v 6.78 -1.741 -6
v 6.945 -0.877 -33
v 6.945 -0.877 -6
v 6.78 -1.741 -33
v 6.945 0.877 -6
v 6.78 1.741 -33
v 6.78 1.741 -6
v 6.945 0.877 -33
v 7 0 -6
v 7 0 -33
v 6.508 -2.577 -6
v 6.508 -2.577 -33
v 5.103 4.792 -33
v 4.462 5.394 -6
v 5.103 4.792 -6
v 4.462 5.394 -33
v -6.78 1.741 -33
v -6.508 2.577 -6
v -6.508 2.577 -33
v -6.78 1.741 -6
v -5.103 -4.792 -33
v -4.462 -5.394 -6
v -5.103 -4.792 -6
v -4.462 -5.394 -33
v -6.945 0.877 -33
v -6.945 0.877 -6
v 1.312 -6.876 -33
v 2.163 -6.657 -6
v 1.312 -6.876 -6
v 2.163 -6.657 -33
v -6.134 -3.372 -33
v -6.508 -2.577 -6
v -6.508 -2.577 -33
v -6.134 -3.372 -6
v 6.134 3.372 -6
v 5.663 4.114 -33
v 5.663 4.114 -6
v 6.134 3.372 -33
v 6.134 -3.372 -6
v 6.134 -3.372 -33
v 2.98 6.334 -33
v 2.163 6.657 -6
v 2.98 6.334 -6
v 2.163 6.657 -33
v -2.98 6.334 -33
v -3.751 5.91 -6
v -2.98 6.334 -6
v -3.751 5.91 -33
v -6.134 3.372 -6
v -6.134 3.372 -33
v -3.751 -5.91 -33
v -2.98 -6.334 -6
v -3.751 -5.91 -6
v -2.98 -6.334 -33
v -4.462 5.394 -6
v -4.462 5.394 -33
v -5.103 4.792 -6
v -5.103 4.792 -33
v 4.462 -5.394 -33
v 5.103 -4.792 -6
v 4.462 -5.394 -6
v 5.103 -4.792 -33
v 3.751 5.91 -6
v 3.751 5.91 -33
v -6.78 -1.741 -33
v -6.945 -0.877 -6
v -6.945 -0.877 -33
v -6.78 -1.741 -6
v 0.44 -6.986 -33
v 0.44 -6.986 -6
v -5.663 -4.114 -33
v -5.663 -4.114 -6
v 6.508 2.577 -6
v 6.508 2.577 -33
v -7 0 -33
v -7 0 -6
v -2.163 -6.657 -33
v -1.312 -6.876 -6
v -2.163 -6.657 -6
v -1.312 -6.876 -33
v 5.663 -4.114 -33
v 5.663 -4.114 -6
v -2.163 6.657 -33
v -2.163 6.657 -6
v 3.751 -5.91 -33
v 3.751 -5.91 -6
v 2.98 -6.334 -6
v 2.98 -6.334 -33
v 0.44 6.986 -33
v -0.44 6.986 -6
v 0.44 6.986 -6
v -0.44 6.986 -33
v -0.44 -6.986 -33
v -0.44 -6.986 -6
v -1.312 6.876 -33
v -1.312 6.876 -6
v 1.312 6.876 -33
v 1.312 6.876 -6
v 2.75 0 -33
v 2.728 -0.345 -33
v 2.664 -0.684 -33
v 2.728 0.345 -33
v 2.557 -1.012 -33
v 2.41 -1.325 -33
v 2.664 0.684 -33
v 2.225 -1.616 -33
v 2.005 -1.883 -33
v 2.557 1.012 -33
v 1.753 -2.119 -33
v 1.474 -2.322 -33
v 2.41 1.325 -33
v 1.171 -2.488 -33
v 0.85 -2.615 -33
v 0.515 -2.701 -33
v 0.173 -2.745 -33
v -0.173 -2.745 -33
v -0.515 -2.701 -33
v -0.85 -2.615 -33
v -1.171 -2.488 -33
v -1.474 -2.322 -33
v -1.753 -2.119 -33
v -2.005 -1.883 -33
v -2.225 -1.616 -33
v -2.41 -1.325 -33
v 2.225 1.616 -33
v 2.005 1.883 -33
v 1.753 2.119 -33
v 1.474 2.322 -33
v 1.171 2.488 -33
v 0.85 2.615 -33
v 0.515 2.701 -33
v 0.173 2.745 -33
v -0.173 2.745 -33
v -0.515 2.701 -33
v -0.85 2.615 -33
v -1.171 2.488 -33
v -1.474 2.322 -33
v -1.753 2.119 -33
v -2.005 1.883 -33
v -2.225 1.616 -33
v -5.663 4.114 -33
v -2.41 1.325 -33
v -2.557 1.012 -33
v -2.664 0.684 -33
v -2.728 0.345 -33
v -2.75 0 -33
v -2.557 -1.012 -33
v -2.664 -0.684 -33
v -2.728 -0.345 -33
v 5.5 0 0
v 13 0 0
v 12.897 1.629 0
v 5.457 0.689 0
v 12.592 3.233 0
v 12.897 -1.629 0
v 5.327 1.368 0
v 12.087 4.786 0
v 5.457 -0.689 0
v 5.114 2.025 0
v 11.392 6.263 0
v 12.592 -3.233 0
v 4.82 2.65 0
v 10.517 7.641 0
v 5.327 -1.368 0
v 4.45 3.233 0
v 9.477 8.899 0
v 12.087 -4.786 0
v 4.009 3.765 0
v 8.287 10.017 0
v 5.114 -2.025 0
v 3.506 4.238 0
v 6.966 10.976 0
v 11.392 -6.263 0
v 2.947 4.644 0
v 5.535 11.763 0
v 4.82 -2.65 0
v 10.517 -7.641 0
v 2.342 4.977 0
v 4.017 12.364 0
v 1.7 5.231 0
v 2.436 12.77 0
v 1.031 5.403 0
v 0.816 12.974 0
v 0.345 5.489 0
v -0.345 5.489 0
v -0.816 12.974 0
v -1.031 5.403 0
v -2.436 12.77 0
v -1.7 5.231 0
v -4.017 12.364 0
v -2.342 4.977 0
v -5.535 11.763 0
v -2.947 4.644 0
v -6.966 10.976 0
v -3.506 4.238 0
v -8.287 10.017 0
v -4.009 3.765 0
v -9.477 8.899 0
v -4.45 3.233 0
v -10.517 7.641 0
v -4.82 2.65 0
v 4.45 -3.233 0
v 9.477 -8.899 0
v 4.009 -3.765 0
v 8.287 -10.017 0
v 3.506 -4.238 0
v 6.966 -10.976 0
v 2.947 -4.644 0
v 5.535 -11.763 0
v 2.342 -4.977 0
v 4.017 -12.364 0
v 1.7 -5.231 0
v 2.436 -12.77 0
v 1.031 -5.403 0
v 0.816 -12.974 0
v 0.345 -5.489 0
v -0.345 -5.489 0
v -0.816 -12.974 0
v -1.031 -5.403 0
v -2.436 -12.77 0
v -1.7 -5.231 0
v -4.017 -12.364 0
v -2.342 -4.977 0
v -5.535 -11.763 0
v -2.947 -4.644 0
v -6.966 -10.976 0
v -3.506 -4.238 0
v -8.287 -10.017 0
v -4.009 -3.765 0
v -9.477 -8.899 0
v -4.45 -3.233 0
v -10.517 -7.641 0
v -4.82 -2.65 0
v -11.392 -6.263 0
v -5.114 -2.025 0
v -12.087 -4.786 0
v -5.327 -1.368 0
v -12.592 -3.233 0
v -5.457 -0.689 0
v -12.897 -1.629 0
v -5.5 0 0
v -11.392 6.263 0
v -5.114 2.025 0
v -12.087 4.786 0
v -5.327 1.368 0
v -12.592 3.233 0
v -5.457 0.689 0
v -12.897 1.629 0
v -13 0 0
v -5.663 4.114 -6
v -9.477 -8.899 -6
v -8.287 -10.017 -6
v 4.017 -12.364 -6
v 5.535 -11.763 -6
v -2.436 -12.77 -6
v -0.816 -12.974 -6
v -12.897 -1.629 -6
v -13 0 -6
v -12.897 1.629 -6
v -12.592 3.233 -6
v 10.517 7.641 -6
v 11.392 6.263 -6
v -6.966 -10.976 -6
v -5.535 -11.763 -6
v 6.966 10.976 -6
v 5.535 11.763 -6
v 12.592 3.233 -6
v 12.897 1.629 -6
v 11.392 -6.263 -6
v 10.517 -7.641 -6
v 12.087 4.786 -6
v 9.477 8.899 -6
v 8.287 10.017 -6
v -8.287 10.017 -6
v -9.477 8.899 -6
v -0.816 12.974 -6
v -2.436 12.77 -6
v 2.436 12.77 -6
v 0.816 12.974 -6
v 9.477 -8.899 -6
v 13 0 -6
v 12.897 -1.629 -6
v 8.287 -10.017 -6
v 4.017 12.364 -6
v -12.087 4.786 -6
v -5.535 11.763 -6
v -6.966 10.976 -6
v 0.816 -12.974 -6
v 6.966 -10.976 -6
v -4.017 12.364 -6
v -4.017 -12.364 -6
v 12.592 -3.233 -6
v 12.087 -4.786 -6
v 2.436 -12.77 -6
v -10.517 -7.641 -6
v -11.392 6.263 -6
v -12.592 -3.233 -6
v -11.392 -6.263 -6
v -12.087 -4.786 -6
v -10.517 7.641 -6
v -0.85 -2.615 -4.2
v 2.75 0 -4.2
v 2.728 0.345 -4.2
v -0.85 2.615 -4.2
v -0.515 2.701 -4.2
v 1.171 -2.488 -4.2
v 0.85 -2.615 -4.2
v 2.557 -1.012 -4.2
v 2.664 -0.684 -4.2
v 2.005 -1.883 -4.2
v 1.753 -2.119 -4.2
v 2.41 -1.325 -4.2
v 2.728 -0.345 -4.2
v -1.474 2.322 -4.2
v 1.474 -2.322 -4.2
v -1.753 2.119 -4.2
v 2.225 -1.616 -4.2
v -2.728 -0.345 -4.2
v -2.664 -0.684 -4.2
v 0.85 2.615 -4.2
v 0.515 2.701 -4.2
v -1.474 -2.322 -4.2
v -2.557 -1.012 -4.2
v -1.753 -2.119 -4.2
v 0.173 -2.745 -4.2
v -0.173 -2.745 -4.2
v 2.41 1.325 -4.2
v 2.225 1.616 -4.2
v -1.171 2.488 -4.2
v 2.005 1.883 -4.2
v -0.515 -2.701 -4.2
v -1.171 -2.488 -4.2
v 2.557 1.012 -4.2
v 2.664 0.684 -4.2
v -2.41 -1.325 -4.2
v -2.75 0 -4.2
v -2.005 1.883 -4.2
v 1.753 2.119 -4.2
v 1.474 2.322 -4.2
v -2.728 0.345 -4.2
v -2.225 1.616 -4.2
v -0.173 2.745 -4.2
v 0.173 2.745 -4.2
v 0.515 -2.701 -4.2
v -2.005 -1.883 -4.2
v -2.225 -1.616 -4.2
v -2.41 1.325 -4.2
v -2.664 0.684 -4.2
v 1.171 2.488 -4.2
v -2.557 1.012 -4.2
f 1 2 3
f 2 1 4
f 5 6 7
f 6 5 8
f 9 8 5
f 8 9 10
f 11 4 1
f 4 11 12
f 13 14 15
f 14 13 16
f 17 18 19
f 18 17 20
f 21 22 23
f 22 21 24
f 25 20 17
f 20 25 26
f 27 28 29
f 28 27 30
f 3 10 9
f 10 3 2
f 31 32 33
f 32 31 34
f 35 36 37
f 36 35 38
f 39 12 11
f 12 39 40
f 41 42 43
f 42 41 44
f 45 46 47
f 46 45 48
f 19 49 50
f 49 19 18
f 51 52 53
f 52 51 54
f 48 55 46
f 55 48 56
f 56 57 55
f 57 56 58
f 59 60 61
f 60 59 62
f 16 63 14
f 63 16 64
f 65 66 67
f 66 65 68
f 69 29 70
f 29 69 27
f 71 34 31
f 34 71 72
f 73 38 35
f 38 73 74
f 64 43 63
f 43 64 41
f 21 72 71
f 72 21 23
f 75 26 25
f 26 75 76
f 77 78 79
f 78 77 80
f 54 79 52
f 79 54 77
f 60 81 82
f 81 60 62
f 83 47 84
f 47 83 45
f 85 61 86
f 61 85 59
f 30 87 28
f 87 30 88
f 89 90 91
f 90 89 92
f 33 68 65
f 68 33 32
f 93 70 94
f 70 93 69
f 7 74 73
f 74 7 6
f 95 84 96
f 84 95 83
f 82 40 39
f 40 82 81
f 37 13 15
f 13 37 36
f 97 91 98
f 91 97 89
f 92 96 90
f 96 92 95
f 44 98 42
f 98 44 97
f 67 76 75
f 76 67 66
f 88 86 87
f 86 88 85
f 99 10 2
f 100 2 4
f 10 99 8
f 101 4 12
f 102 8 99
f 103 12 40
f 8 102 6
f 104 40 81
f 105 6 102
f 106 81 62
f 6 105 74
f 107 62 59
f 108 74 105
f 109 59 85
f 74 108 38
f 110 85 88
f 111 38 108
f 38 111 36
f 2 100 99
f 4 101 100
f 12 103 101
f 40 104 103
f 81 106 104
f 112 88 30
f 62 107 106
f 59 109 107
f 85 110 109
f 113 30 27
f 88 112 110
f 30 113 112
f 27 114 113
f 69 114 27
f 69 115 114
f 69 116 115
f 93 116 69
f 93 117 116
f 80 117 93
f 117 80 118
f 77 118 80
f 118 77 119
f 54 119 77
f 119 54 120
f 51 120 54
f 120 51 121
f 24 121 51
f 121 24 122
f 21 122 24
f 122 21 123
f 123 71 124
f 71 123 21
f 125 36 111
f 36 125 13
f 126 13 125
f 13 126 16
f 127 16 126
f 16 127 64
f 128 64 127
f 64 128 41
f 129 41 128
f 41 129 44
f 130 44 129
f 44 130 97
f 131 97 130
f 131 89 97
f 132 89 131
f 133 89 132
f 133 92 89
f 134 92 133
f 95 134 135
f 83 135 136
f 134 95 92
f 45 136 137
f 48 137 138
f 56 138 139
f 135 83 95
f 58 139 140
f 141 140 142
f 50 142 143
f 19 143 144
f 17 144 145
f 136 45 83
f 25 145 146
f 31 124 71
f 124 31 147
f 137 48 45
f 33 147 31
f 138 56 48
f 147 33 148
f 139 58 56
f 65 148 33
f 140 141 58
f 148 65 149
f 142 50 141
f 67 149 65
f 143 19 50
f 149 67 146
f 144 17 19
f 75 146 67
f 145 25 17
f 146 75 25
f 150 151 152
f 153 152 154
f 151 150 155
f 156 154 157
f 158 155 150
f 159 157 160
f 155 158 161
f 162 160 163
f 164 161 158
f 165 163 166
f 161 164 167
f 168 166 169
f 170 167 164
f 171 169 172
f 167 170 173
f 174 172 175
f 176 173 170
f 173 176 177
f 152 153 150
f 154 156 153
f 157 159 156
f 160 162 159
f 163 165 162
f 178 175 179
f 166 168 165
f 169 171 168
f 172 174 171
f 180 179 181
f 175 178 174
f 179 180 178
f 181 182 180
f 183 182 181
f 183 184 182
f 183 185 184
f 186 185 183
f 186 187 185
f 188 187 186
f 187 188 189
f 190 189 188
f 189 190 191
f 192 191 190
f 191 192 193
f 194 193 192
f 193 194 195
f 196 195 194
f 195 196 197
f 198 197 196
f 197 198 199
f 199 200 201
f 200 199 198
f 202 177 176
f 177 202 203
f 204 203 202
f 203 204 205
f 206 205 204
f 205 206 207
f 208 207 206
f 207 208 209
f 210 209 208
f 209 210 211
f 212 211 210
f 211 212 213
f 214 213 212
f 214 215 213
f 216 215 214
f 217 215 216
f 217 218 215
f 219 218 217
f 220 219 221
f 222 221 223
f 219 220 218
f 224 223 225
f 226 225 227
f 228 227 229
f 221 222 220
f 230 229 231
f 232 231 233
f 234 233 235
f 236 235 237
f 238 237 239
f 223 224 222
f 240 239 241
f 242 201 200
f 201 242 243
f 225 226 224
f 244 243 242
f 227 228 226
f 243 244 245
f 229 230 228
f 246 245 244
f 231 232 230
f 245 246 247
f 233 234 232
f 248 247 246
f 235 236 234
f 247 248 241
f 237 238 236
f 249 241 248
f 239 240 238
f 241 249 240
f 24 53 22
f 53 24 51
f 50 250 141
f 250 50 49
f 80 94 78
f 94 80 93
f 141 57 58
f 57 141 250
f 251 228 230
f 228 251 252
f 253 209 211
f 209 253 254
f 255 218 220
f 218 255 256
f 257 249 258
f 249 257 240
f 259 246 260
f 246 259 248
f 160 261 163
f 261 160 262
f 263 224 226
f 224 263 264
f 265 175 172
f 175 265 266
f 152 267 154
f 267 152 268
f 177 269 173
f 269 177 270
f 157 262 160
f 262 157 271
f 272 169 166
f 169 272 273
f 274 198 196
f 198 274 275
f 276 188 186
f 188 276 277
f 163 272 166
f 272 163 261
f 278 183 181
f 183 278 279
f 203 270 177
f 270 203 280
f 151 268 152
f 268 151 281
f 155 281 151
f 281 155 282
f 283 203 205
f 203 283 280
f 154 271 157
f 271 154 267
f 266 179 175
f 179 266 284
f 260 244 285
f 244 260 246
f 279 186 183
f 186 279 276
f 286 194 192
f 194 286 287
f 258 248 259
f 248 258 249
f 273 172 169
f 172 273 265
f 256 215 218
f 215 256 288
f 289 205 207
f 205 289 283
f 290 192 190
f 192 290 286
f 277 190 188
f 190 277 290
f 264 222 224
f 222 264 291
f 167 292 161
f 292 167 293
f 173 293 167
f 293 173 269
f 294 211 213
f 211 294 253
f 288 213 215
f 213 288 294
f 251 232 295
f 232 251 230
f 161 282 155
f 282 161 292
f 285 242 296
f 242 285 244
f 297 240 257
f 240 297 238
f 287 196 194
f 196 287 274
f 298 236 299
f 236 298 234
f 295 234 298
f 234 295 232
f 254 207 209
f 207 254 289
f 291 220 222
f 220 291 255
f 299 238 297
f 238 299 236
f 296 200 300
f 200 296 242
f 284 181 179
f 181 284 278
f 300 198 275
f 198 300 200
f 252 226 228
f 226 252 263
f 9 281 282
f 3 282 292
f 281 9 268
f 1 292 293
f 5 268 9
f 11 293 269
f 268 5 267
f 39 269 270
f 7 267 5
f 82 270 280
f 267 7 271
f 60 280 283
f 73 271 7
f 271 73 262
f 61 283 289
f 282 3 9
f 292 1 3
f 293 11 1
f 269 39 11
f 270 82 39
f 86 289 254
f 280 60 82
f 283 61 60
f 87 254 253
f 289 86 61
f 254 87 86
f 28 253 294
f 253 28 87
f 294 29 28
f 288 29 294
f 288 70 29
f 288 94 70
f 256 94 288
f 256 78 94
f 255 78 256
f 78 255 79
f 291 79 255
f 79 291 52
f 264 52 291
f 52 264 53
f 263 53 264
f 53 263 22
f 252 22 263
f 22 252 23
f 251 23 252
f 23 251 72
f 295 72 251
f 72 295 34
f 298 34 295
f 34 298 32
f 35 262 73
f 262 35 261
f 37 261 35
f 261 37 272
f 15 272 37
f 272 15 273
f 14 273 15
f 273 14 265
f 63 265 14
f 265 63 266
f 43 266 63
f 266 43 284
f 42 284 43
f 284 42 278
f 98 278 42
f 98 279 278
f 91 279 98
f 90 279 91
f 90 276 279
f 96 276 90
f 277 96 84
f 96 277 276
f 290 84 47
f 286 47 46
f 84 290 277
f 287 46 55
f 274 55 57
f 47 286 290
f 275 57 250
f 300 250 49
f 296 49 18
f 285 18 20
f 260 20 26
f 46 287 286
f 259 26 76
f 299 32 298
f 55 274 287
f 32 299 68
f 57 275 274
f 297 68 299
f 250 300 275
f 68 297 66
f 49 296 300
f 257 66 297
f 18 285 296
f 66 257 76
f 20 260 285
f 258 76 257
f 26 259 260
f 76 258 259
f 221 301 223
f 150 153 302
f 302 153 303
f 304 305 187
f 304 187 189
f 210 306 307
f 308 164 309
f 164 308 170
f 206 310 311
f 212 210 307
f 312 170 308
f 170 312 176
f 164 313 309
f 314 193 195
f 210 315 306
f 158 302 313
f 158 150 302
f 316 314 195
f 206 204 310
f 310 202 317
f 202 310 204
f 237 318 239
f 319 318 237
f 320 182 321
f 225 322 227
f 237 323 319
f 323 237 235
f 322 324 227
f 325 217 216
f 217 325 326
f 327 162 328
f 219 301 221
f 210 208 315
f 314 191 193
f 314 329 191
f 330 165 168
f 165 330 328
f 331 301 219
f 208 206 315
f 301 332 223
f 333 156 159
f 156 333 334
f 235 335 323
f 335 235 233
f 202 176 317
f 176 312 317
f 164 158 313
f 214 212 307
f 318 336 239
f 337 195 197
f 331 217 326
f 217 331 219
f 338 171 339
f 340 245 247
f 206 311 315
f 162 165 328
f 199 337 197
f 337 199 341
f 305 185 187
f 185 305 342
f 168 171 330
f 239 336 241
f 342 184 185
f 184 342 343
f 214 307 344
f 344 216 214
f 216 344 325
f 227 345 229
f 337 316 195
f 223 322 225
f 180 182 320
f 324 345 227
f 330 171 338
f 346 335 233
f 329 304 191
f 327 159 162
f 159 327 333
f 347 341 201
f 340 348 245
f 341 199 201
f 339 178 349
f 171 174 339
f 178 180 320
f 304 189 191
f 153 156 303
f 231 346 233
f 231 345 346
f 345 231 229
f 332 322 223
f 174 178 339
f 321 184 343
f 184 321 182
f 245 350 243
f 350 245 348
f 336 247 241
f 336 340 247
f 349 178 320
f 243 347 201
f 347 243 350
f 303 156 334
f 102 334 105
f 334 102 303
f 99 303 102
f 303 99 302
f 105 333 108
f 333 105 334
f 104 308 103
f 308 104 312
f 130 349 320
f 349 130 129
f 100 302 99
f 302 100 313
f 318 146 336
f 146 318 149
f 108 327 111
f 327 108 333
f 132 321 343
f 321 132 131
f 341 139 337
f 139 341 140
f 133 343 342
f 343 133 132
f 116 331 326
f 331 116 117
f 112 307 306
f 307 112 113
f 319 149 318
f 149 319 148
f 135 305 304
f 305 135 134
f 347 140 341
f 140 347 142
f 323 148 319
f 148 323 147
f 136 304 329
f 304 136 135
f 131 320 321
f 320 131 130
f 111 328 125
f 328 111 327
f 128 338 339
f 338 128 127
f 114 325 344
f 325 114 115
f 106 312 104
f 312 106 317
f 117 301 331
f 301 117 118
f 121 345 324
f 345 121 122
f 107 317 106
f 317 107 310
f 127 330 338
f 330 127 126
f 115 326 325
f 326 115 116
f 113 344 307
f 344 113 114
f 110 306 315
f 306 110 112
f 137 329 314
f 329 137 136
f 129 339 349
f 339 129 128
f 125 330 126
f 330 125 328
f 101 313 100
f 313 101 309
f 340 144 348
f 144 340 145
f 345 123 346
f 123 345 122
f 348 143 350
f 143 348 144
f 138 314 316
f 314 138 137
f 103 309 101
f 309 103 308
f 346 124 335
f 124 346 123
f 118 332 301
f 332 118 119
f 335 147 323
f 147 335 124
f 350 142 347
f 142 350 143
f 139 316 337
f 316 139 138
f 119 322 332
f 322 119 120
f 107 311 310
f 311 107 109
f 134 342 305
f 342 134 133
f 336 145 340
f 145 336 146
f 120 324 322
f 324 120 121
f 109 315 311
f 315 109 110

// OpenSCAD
$fn = 50;


difference() {
	union() {
		translate(v = [0, 0, -33.0000000000]) {
			cylinder(h = 33, r = 7.0000000000);
		}
		translate(v = [0, 0, -6.0000000000]) {
			cylinder(h = 6, r = 13.0000000000);
		}
	}
	union() {
		translate(v = [0, 0, 0]) {
			rotate(a = [0, 0, 0]) {
				difference() {
					union() {
						#translate(v = [0, 0, -33.0000000000]) {
							cylinder(h = 33, r = 2.2500000000);
						}
						#translate(v = [0, 0, -4.2000000000]) {
							cylinder(h = 4.2000000000, r1 = 2.7500000000, r2 = 5.5000000000);
						}
						#translate(v = [0, 0, -33.0000000000]) {
							cylinder(h = 33, r = 2.7500000000);
						}
						#translate(v = [0, 0, -33.0000000000]) {
							cylinder(h = 33, r = 2.2500000000);
						}
					}
					union();
				}
			}
		}
	}
}
